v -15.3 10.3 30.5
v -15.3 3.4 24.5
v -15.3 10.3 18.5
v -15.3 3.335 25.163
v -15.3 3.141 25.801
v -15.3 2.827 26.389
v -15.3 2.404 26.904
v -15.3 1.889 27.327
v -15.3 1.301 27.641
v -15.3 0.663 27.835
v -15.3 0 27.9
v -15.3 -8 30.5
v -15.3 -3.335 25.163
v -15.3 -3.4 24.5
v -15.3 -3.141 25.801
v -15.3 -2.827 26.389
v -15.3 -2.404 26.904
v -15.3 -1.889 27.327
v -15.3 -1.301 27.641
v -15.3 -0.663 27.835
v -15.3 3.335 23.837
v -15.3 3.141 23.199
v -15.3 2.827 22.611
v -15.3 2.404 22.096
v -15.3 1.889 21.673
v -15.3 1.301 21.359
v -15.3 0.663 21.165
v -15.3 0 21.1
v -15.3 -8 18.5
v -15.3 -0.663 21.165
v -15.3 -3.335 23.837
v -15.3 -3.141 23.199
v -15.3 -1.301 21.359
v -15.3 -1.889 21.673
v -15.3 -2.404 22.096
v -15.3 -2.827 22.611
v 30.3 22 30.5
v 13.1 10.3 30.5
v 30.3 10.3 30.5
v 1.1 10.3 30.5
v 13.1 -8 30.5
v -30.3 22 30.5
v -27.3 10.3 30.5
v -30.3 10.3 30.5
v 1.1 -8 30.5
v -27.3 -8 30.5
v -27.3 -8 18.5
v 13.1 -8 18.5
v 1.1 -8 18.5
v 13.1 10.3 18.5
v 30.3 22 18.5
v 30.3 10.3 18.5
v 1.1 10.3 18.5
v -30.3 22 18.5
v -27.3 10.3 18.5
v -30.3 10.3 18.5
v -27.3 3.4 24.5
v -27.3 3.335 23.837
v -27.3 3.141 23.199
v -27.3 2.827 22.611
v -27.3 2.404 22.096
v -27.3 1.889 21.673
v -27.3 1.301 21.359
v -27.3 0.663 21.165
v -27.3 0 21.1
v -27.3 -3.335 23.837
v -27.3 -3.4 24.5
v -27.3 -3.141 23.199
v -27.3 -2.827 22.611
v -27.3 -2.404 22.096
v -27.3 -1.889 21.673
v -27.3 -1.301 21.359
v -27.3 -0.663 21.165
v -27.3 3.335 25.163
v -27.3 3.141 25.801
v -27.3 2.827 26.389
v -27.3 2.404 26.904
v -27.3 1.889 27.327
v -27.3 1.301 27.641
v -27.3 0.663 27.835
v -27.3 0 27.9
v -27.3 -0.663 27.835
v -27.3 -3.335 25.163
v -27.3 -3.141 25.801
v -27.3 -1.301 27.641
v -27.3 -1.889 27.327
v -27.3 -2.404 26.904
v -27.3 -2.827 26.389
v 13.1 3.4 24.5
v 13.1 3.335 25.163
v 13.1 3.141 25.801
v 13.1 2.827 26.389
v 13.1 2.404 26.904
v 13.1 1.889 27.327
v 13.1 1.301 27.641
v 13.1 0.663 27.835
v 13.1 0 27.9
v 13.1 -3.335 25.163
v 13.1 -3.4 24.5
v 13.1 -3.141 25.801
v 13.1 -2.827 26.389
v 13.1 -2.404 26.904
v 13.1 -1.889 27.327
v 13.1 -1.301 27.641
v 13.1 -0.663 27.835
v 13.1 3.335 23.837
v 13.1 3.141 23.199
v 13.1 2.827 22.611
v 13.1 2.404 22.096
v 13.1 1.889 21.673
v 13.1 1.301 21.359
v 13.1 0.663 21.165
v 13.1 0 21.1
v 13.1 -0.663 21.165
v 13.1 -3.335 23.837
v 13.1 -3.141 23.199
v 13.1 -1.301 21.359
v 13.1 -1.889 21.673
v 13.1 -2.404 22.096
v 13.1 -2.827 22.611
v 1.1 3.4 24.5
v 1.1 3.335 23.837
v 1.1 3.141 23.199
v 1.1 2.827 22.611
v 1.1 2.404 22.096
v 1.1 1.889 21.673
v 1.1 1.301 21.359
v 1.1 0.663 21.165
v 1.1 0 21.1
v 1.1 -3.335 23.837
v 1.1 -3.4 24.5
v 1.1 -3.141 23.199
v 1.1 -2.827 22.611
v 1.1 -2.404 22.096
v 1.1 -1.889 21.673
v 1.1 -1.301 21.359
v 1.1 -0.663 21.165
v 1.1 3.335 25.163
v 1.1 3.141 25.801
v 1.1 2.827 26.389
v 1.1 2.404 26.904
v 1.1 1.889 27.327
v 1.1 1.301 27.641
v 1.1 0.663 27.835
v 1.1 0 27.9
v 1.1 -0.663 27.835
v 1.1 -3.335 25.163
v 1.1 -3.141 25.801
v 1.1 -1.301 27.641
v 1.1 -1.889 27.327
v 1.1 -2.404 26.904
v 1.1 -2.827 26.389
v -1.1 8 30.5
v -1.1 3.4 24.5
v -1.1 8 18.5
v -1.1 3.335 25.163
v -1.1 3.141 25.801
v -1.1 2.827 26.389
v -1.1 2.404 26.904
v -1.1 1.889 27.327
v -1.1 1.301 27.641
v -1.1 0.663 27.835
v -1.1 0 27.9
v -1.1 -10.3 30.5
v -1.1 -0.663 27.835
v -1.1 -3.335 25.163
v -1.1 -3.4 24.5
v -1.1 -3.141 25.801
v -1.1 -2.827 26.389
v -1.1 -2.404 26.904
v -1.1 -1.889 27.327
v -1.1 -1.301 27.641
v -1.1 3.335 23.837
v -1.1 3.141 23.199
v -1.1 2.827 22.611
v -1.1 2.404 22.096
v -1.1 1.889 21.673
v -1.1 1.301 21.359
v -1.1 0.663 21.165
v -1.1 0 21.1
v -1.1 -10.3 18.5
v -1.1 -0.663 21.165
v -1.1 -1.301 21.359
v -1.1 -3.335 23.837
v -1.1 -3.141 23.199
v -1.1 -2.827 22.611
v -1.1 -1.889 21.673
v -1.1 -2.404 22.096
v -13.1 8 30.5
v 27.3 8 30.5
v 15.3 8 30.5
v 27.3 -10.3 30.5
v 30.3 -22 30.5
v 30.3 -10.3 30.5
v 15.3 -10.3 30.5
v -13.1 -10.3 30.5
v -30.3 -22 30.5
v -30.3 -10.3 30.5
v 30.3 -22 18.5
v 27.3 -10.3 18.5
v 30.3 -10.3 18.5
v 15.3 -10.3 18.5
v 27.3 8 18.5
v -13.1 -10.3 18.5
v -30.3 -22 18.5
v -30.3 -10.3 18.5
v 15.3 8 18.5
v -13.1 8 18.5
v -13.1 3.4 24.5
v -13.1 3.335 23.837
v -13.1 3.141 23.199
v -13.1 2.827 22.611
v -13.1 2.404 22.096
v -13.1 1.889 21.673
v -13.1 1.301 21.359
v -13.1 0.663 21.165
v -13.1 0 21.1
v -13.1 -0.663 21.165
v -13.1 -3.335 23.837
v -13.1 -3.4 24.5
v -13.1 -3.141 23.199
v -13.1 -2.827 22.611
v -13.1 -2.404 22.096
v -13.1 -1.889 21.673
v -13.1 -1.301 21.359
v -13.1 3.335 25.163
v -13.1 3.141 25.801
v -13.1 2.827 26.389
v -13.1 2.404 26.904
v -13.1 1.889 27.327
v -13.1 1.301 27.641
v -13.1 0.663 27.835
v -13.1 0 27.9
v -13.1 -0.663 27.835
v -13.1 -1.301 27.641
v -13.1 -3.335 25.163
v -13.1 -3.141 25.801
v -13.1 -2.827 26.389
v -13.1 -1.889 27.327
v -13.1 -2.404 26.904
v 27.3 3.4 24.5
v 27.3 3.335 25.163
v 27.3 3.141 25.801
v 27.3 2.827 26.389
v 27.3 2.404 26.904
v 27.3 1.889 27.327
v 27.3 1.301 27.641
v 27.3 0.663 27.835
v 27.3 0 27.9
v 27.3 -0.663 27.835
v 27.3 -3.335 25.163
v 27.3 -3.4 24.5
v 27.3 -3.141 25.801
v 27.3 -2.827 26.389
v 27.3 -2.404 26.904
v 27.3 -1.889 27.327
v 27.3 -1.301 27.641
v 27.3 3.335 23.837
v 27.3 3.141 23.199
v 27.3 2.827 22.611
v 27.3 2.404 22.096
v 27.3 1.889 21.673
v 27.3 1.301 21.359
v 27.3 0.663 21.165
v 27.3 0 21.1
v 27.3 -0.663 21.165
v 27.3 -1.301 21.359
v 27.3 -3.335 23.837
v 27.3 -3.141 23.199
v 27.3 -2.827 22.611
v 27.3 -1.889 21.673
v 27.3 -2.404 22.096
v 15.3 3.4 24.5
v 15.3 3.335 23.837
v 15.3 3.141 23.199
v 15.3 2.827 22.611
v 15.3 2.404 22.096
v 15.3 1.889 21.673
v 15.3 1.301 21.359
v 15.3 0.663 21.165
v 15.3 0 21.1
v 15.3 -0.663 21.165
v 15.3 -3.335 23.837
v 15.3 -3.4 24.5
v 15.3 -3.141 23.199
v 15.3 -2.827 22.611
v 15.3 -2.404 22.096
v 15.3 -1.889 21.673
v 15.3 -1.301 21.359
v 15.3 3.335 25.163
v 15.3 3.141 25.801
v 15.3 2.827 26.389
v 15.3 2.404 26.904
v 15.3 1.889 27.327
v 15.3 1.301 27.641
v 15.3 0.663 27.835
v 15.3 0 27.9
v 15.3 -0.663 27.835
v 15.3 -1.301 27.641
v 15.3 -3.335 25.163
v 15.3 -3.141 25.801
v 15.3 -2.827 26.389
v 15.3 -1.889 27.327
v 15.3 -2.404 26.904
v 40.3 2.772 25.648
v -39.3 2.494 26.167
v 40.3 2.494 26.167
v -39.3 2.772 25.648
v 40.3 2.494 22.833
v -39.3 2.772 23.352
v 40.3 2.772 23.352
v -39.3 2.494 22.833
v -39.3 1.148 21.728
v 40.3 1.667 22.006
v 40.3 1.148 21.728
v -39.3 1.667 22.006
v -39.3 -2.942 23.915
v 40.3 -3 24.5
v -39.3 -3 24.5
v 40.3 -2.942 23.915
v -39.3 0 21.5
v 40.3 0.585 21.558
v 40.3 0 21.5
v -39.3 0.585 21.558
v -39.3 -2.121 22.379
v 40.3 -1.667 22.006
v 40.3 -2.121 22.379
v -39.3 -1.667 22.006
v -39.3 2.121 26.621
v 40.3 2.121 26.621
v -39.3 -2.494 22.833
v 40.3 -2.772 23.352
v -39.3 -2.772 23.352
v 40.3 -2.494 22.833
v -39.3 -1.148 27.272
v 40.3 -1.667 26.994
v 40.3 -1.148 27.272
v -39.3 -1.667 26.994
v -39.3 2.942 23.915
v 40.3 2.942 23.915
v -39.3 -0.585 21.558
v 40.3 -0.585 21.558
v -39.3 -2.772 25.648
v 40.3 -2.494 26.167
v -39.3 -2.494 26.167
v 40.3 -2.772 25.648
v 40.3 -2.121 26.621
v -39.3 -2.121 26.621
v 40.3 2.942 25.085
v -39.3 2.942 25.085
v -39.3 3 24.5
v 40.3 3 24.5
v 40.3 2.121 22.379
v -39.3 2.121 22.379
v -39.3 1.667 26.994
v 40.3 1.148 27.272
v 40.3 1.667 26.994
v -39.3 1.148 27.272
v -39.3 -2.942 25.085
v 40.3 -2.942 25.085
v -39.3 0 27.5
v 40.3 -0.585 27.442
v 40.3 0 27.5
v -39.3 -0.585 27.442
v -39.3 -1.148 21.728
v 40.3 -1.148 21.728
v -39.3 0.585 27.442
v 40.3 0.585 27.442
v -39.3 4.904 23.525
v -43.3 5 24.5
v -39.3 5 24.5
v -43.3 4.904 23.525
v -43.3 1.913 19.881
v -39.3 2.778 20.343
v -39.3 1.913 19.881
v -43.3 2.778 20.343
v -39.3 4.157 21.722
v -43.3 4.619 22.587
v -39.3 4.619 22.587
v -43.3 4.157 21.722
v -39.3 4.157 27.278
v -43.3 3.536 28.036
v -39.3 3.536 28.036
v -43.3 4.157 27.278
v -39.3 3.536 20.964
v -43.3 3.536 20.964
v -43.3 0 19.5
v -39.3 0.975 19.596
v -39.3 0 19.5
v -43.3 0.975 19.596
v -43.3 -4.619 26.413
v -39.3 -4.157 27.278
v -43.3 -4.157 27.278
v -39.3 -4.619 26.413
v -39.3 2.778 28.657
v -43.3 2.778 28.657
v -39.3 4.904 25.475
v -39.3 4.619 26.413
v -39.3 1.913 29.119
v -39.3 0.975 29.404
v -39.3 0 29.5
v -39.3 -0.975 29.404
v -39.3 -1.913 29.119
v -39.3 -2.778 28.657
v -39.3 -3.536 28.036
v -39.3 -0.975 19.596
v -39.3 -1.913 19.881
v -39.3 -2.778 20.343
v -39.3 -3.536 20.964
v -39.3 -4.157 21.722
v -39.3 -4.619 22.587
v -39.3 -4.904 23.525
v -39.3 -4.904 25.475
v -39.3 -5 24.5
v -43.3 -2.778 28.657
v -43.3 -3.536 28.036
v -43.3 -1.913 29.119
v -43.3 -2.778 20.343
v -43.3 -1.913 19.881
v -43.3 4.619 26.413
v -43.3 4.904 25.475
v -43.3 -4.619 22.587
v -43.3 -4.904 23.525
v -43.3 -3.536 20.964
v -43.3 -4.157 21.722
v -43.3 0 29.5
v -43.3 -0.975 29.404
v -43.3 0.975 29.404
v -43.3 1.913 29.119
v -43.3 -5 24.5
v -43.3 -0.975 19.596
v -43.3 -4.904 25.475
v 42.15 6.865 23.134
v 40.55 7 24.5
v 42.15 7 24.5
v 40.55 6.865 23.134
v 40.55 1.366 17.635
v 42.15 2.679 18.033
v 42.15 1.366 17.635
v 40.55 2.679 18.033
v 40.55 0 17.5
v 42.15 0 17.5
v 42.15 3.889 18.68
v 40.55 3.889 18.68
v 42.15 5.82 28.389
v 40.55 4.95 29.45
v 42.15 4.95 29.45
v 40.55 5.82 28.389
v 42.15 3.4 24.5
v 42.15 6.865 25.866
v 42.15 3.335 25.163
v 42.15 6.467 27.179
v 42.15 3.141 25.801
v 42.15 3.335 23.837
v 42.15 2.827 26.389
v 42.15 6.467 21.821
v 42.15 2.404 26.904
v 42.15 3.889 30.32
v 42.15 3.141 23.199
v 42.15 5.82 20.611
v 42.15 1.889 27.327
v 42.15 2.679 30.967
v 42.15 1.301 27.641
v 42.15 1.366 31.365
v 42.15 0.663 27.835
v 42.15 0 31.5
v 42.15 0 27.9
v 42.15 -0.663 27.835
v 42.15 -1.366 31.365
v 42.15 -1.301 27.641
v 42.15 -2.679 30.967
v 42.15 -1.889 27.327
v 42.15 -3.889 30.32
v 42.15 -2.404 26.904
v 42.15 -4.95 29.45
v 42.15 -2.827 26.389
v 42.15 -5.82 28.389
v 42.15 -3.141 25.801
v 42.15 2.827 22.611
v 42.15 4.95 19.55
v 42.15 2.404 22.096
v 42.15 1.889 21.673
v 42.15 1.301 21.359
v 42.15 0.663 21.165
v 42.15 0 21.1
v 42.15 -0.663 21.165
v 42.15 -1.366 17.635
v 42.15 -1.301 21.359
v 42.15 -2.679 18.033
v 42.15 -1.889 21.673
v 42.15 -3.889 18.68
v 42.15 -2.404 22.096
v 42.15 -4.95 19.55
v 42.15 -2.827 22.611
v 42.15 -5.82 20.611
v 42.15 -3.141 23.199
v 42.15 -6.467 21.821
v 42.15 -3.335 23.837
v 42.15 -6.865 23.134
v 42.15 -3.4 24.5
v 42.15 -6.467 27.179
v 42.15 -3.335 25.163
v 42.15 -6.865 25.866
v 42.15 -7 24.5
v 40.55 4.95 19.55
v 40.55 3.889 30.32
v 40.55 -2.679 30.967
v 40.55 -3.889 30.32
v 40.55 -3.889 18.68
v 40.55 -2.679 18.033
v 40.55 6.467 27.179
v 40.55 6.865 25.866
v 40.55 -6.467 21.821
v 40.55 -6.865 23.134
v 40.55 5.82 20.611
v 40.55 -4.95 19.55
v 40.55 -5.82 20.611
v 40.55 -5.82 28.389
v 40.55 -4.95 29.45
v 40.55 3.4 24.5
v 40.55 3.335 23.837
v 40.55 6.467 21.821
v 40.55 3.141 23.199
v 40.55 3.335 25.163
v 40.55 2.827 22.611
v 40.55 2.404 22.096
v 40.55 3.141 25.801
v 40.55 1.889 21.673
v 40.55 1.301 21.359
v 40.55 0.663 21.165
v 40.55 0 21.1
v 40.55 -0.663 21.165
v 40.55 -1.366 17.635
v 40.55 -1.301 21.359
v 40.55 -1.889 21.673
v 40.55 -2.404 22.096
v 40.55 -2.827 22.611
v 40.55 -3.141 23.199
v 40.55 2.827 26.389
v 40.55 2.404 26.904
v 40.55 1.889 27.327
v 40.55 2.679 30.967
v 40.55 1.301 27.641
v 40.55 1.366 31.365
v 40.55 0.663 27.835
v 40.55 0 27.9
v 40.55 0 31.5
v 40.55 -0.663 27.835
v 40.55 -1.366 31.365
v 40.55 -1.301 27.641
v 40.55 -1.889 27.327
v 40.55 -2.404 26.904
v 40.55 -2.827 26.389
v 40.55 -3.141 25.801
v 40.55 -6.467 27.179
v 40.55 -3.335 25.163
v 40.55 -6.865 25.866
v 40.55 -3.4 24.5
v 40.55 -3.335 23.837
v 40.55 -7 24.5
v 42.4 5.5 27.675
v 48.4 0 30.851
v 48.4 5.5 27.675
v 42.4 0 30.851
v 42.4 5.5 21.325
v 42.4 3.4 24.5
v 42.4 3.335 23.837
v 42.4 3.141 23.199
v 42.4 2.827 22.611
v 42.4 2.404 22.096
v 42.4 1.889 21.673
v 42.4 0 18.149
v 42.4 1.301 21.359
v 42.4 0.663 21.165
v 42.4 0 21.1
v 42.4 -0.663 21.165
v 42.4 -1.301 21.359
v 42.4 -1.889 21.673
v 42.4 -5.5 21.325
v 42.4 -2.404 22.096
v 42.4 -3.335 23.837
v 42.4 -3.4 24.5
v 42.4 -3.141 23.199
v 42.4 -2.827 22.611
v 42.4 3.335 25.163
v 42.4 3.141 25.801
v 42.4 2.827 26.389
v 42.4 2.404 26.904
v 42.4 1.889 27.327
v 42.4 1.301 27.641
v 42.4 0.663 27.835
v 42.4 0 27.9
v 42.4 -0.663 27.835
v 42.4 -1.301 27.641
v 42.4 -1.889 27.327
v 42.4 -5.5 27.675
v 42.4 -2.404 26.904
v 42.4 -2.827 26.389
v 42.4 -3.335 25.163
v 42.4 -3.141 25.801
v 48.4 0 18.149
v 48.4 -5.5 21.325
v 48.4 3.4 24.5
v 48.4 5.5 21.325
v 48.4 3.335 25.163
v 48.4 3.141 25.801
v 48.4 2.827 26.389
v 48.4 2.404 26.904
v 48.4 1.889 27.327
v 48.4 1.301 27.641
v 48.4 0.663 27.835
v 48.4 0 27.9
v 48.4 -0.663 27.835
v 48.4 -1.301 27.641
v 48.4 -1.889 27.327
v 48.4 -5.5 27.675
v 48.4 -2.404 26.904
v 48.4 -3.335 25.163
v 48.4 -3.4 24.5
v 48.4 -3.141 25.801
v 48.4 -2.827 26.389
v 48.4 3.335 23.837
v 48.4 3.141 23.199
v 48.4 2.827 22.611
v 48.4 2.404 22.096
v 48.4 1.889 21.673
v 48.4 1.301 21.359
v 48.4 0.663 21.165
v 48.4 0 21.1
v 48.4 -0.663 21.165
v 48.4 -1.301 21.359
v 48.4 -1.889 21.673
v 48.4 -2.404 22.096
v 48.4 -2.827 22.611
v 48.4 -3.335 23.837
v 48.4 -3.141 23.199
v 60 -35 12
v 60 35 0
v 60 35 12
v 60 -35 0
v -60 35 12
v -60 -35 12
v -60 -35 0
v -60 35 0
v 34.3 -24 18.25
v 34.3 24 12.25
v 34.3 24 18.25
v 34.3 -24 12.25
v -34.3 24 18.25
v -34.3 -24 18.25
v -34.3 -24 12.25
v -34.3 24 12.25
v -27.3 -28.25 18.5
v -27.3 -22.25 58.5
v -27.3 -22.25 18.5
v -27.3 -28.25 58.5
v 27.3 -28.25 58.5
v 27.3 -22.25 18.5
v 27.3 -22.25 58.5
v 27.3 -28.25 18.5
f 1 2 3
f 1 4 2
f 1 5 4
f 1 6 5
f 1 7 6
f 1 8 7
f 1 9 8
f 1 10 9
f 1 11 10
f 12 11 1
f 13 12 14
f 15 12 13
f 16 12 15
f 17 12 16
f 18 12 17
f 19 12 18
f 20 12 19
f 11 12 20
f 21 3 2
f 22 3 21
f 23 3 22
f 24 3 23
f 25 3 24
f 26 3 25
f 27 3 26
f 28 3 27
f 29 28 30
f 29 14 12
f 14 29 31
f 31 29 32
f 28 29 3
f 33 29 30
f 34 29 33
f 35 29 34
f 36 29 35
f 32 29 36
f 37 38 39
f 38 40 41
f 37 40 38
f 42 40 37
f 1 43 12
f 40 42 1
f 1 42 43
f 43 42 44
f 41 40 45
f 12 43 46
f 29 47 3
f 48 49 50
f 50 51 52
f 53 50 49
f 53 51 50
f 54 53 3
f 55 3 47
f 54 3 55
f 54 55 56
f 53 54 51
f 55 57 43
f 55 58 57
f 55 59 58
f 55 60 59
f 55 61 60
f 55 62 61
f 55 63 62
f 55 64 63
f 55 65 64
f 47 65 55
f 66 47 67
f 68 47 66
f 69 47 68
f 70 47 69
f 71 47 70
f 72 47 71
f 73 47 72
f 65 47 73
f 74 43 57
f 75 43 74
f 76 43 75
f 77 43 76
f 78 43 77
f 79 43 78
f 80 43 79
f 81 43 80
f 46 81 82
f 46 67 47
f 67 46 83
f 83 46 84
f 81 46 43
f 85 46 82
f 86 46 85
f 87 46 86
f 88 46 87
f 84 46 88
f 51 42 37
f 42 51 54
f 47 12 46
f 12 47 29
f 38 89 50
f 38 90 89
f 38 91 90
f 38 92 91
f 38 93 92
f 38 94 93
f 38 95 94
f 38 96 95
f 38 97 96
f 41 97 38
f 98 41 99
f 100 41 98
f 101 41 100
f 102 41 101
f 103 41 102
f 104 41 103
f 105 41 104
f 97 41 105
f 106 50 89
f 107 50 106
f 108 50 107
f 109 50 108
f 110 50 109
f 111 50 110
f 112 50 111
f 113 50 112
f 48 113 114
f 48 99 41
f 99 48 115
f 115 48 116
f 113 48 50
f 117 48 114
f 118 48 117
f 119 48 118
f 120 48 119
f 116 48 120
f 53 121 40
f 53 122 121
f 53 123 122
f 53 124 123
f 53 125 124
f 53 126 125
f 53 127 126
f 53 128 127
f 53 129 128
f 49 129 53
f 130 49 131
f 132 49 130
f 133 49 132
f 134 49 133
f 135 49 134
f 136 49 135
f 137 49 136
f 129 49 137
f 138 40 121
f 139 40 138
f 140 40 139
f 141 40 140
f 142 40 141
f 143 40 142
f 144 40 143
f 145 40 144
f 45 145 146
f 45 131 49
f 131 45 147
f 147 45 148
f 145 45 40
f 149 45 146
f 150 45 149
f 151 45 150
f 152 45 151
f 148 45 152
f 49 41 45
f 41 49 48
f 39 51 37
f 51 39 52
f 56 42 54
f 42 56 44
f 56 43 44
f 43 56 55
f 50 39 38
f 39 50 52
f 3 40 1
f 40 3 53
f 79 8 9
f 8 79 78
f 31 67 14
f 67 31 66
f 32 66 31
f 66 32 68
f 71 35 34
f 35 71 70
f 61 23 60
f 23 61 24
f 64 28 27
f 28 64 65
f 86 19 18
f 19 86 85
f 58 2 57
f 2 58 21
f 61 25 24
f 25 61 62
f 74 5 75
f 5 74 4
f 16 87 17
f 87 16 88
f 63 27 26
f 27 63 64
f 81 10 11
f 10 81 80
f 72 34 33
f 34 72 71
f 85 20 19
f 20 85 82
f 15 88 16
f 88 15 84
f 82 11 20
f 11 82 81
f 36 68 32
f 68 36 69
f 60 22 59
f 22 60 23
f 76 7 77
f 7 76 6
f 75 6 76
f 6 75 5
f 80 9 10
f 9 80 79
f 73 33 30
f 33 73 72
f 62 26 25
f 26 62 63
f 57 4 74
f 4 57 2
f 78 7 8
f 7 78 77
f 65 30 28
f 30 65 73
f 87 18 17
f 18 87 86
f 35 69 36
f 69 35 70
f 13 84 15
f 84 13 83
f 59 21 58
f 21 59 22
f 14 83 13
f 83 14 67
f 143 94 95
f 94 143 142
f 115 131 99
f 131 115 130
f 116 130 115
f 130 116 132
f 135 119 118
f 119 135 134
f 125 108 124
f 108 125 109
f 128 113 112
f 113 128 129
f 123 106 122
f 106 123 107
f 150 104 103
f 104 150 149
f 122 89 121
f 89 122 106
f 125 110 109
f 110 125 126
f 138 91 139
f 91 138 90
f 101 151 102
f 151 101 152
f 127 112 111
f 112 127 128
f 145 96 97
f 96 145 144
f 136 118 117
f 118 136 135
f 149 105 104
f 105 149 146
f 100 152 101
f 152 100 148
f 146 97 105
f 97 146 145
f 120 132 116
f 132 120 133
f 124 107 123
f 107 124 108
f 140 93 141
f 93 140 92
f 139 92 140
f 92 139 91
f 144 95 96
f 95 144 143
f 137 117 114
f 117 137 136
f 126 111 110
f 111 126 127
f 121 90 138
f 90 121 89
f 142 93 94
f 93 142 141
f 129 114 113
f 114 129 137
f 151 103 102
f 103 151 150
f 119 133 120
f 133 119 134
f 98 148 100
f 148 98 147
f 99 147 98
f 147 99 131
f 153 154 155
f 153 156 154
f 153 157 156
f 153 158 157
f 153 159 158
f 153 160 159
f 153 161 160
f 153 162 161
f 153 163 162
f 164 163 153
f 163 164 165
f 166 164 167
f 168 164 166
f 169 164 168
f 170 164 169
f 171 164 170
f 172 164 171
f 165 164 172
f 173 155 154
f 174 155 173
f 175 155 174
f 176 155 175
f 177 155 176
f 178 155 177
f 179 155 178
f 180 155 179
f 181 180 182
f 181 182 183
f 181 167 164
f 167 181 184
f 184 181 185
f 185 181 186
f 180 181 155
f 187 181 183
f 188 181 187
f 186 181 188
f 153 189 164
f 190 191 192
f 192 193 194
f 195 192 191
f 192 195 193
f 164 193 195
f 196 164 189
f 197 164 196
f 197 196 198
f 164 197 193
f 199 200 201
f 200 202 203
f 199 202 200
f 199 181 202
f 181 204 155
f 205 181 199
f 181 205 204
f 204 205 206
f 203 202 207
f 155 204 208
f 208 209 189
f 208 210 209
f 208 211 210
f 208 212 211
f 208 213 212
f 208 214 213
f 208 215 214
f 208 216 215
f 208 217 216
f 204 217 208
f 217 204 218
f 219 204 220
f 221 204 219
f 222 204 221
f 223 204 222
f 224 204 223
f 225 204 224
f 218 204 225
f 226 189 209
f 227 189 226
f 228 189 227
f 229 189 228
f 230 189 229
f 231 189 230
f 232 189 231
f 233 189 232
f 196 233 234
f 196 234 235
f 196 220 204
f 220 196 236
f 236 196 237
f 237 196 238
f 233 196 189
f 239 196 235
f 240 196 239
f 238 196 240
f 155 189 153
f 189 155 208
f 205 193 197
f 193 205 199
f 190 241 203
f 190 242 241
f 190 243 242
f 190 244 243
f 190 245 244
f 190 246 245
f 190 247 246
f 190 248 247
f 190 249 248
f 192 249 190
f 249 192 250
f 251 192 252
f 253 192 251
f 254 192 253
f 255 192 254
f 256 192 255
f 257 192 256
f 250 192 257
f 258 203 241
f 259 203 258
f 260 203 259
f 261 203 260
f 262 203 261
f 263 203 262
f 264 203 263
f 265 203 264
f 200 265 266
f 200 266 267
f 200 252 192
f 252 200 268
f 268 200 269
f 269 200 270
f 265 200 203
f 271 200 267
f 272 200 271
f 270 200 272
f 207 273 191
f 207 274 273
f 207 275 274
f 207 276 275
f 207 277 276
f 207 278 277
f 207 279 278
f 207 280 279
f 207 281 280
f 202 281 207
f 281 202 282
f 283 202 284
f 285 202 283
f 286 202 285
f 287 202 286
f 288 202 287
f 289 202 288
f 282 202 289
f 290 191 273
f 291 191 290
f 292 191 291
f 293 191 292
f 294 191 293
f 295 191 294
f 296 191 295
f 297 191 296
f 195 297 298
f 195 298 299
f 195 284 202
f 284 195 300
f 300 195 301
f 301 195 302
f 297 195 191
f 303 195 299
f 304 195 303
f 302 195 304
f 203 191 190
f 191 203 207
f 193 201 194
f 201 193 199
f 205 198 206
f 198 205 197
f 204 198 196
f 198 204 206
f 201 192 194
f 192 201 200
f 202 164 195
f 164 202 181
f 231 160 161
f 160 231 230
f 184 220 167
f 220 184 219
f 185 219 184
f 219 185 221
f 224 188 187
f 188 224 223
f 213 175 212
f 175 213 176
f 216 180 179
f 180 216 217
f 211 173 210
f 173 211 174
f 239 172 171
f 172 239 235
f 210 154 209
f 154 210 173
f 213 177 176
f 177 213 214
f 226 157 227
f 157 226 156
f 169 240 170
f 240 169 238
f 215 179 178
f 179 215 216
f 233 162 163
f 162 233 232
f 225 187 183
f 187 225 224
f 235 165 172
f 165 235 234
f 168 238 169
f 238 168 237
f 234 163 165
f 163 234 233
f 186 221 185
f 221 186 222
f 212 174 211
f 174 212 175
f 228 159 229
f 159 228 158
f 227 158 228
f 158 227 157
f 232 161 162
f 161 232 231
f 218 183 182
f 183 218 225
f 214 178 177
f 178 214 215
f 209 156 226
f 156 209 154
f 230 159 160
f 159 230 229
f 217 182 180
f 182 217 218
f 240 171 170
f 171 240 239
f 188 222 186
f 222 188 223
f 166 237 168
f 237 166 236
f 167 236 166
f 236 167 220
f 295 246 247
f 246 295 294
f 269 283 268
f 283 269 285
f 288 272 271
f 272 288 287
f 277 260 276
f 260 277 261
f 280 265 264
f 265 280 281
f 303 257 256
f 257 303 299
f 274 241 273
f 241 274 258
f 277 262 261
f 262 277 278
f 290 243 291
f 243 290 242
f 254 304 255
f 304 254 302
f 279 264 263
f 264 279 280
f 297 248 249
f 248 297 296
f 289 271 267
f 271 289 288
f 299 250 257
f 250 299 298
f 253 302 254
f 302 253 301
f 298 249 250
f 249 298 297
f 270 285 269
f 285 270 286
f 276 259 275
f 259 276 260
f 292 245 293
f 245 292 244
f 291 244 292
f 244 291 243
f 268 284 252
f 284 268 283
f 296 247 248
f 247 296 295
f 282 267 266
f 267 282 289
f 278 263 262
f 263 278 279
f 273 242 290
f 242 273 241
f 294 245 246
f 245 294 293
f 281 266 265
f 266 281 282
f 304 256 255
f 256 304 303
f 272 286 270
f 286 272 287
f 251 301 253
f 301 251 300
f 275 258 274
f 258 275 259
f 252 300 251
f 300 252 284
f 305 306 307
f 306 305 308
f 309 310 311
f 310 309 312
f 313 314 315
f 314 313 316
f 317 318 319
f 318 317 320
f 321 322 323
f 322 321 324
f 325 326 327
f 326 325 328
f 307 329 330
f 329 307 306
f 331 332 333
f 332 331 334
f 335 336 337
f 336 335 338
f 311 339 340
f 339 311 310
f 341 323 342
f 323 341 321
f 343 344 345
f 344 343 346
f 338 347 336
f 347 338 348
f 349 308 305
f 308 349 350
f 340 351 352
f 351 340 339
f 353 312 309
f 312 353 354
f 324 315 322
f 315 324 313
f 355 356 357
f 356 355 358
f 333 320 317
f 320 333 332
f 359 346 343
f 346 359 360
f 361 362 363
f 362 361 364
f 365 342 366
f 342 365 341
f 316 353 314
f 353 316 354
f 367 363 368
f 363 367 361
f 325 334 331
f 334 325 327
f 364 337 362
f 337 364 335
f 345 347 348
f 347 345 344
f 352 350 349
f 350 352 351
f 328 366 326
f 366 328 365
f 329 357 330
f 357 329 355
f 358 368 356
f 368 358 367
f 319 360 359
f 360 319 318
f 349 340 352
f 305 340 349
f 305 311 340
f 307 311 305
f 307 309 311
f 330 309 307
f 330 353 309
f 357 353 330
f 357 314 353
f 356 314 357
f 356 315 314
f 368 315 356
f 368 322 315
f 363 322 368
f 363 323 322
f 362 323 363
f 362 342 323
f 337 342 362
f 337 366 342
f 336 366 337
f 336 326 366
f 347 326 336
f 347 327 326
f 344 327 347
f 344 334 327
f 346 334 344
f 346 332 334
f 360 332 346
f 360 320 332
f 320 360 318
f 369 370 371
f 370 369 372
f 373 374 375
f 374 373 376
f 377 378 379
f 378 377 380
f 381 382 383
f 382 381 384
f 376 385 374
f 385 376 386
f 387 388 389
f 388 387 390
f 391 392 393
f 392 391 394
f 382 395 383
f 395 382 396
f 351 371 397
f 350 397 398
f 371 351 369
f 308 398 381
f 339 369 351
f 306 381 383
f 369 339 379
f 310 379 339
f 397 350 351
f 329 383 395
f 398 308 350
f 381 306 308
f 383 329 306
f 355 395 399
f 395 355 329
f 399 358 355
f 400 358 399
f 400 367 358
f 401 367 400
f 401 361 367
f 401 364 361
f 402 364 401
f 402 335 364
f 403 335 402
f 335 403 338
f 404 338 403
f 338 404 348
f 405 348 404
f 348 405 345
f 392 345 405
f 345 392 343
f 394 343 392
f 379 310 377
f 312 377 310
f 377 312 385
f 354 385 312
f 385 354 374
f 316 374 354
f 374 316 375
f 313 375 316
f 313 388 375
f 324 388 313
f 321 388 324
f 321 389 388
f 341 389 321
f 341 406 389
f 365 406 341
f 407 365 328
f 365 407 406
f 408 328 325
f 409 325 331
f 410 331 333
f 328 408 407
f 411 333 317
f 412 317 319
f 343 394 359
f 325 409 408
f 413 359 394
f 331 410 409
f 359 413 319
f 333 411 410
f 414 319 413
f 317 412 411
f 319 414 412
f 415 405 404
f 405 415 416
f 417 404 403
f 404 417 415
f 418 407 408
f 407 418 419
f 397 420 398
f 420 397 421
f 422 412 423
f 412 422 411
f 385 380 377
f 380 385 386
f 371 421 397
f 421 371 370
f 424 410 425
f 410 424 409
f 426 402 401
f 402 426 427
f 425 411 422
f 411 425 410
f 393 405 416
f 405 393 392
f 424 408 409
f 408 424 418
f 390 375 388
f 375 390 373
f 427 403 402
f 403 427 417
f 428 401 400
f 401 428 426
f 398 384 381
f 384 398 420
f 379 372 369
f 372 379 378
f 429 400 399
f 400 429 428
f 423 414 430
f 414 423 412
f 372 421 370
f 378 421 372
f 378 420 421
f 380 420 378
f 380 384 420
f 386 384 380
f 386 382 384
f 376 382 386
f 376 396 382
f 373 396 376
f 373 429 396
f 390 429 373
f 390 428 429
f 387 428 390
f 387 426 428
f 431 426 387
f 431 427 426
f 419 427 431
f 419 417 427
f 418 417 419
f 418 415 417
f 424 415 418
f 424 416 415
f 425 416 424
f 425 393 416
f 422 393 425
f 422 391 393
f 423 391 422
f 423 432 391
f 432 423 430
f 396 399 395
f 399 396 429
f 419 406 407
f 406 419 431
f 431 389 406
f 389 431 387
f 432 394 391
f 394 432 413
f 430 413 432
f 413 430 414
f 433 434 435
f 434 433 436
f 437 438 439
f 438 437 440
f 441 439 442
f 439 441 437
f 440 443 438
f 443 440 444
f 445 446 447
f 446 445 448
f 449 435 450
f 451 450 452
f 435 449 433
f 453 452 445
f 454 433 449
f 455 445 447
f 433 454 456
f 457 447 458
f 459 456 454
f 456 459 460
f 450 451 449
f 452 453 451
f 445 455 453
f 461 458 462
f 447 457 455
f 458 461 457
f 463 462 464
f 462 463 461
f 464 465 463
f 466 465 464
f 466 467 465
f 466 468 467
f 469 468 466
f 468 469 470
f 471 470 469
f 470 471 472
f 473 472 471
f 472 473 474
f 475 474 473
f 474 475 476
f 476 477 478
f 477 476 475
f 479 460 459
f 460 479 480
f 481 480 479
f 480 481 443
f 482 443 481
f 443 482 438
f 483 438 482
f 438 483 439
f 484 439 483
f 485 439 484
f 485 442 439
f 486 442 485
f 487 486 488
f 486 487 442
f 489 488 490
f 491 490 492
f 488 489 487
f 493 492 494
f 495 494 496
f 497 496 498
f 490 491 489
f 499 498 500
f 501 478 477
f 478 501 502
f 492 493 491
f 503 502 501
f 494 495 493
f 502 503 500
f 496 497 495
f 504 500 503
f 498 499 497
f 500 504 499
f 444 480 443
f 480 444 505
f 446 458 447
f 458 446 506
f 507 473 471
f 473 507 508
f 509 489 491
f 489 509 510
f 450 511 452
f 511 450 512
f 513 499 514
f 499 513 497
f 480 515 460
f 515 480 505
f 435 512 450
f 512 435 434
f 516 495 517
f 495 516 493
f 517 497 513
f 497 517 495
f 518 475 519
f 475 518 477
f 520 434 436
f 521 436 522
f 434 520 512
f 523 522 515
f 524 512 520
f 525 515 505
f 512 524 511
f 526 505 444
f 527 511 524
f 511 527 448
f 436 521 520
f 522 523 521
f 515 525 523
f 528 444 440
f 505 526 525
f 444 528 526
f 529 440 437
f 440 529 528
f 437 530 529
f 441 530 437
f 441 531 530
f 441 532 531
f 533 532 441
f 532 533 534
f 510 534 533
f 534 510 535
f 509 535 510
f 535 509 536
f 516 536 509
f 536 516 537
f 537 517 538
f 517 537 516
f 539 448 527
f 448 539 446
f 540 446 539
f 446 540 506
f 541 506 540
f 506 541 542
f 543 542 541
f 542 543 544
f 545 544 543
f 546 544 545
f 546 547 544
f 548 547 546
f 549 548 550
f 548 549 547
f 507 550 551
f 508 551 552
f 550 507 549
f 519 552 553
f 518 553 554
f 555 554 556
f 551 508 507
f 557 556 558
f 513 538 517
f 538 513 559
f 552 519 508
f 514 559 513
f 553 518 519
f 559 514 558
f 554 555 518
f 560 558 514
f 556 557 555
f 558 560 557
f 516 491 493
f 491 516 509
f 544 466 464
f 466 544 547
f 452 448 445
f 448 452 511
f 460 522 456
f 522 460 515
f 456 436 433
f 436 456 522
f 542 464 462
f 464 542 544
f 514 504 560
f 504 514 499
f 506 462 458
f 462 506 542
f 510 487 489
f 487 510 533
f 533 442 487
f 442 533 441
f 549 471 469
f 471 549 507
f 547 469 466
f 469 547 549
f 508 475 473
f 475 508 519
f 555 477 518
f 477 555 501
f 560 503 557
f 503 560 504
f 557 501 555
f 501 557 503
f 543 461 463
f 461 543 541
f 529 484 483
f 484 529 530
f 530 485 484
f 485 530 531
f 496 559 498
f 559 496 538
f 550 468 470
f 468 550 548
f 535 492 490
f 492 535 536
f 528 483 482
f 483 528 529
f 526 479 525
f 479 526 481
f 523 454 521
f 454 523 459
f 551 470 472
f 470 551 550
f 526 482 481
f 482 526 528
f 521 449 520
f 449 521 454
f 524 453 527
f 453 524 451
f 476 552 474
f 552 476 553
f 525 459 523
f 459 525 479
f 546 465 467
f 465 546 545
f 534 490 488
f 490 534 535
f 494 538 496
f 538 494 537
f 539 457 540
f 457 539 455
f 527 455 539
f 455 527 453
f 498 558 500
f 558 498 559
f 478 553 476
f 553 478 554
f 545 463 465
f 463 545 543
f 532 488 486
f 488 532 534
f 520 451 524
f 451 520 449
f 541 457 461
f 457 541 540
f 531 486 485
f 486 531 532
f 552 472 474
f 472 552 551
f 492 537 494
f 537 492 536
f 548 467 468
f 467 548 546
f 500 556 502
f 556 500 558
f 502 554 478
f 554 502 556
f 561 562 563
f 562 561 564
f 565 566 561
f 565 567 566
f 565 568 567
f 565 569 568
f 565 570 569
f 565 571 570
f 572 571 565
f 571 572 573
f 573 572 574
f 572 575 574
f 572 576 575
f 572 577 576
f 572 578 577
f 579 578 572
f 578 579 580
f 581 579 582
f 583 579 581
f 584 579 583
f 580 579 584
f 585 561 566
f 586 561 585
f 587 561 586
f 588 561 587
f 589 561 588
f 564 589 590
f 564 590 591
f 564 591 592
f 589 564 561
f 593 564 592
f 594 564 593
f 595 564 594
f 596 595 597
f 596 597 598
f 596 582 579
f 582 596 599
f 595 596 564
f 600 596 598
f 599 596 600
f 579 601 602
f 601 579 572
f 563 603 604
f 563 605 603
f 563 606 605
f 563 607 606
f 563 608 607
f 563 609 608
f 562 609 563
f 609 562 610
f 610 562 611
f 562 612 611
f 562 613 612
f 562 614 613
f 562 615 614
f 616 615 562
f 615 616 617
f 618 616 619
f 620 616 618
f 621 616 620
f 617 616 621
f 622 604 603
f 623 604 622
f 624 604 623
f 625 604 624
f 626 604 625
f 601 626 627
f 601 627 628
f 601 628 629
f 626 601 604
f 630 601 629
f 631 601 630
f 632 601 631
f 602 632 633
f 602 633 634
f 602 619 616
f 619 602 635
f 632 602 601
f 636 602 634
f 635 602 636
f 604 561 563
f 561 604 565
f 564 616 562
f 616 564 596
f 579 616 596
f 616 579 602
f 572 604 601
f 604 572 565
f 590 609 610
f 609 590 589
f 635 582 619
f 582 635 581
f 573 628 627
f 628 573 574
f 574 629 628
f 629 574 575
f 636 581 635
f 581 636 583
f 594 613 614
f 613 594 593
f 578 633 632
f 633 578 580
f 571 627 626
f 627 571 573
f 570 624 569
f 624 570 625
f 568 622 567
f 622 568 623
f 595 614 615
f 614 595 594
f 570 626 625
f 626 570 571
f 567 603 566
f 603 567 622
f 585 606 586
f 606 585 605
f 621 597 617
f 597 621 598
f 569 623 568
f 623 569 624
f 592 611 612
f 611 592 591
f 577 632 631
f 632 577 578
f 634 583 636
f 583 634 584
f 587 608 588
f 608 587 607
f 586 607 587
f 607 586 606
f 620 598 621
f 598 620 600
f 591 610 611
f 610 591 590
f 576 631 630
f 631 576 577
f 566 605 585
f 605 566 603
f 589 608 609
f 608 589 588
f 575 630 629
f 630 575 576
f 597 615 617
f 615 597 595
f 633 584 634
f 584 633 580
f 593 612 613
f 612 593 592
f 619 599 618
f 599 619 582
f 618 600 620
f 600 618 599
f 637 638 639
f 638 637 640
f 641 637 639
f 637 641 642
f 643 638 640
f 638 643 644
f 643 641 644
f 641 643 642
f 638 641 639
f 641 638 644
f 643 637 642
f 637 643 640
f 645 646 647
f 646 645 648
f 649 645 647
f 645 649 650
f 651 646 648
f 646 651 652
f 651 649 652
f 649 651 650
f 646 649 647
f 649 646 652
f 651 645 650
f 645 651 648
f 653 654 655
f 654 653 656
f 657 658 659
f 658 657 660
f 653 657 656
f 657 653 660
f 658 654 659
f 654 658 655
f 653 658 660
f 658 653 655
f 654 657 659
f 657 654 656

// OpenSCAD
$fn = 32;

// ------------------------------------------------------------------------
// Comb hinge with flap: leaf 60.6 x 22 mm, pin d6, flap 40 mm
// Every part is its own module, assembly() places every instance.
// ------------------------------------------------------------------------

// --- part 1 ---
module hinge_bed() {
  difference() {
    translate([-60, -35, 0]) cube([120, 70, 12]);
  }
}

// --- part 2 ---
module hinge_riser() {
  difference() {
    translate([-34.3, -24, 0]) cube([68.6, 48, 6]);
  }
}

// --- part 3 ---
module hinge_leaf_a() {
  difference() {
    union() {
      translate([-27.3, -8, -6]) cube([12, 30, 12]);
      translate([1.1, -8, -6]) cube([12, 30, 12]);
      translate([-30.3, 10.3, -6]) cube([60.6, 11.7, 12]);
    }
    translate([-21.3, 0, 0]) rotate([0, 90, 0]) cylinder(h = 14, d = 6.8, center = true);
    translate([7.1, 0, 0]) rotate([0, 90, 0]) cylinder(h = 14, d = 6.8, center = true);
  }
}

// --- part 4 ---
module hinge_leaf_b() {
  difference() {
    union() {
      translate([-13.1, -22, -6]) cube([12, 30, 12]);
      translate([15.3, -22, -6]) cube([12, 30, 12]);
      translate([-30.3, -22, -6]) cube([60.6, 11.7, 12]);
    }
    translate([-7.1, 0, 0]) rotate([0, 90, 0]) cylinder(h = 14, d = 6.8, center = true);
    translate([21.3, 0, 0]) rotate([0, 90, 0]) cylinder(h = 14, d = 6.8, center = true);
  }
}

// --- part 5 ---
module hinge_flap() {
  difference() {
    translate([-27.3, -20, 0]) cube([54.6, 40, 6]);
  }
}

// --- part 6 ---
module hinge_pin() {
  rotate([0, 90, 0]) cylinder(h = 80.6, d = 6, center = true);
  translate([-43.3, 0, 0]) rotate([0, 90, 0]) cylinder(h = 4, d = 10);
}

// --- part 7 ---
module pin_washer() {
  difference() {
      translate([0, 0, 0]) cylinder(h = 1.6, d = 14);
      translate([0, 0, -1]) cylinder(h = 3.6, d = 6.8);
    }
}

// --- part 8 ---
module pin_nut() {
  difference() {
    linear_extrude(height = 6) polygon(points = [[6.351, 0], [3.175, 5.5], [-3.175, 5.5], [-6.351, 0], [-3.175, -5.5], [3.175, -5.5]]);
    translate([0, 0, -1]) cylinder(h = 8, d = 6.8);
  }
}

// --- assembly ---
module assembly() {
  color([0.80, 0.24, 0.20]) translate([0, 0, 0]) rotate([0, 0, 0]) hinge_bed();
  color([0.20, 0.45, 0.75]) translate([0, 0, 12.25]) rotate([0, 0, 0]) hinge_riser();
  color([0.25, 0.62, 0.32]) translate([0, 0, 24.5]) rotate([0, 0, 0]) hinge_leaf_a();
  color([0.92, 0.70, 0.18]) translate([0, 0, 24.5]) rotate([0, 0, 0]) hinge_leaf_b();
  color([0.58, 0.35, 0.70]) translate([0, -22.25, 38.5]) rotate([90, 0, 0]) hinge_flap();
  color([0.16, 0.66, 0.66]) translate([0, 0, 24.5]) rotate([0, 0, 0]) hinge_pin();
  color([0.85, 0.48, 0.18]) translate([40.55, 0, 24.5]) rotate([0, 90, 0]) pin_washer();
  color([0.55, 0.60, 0.65]) translate([42.4, 0, 24.5]) rotate([0, 90, 0]) pin_nut();
}

assembly();
